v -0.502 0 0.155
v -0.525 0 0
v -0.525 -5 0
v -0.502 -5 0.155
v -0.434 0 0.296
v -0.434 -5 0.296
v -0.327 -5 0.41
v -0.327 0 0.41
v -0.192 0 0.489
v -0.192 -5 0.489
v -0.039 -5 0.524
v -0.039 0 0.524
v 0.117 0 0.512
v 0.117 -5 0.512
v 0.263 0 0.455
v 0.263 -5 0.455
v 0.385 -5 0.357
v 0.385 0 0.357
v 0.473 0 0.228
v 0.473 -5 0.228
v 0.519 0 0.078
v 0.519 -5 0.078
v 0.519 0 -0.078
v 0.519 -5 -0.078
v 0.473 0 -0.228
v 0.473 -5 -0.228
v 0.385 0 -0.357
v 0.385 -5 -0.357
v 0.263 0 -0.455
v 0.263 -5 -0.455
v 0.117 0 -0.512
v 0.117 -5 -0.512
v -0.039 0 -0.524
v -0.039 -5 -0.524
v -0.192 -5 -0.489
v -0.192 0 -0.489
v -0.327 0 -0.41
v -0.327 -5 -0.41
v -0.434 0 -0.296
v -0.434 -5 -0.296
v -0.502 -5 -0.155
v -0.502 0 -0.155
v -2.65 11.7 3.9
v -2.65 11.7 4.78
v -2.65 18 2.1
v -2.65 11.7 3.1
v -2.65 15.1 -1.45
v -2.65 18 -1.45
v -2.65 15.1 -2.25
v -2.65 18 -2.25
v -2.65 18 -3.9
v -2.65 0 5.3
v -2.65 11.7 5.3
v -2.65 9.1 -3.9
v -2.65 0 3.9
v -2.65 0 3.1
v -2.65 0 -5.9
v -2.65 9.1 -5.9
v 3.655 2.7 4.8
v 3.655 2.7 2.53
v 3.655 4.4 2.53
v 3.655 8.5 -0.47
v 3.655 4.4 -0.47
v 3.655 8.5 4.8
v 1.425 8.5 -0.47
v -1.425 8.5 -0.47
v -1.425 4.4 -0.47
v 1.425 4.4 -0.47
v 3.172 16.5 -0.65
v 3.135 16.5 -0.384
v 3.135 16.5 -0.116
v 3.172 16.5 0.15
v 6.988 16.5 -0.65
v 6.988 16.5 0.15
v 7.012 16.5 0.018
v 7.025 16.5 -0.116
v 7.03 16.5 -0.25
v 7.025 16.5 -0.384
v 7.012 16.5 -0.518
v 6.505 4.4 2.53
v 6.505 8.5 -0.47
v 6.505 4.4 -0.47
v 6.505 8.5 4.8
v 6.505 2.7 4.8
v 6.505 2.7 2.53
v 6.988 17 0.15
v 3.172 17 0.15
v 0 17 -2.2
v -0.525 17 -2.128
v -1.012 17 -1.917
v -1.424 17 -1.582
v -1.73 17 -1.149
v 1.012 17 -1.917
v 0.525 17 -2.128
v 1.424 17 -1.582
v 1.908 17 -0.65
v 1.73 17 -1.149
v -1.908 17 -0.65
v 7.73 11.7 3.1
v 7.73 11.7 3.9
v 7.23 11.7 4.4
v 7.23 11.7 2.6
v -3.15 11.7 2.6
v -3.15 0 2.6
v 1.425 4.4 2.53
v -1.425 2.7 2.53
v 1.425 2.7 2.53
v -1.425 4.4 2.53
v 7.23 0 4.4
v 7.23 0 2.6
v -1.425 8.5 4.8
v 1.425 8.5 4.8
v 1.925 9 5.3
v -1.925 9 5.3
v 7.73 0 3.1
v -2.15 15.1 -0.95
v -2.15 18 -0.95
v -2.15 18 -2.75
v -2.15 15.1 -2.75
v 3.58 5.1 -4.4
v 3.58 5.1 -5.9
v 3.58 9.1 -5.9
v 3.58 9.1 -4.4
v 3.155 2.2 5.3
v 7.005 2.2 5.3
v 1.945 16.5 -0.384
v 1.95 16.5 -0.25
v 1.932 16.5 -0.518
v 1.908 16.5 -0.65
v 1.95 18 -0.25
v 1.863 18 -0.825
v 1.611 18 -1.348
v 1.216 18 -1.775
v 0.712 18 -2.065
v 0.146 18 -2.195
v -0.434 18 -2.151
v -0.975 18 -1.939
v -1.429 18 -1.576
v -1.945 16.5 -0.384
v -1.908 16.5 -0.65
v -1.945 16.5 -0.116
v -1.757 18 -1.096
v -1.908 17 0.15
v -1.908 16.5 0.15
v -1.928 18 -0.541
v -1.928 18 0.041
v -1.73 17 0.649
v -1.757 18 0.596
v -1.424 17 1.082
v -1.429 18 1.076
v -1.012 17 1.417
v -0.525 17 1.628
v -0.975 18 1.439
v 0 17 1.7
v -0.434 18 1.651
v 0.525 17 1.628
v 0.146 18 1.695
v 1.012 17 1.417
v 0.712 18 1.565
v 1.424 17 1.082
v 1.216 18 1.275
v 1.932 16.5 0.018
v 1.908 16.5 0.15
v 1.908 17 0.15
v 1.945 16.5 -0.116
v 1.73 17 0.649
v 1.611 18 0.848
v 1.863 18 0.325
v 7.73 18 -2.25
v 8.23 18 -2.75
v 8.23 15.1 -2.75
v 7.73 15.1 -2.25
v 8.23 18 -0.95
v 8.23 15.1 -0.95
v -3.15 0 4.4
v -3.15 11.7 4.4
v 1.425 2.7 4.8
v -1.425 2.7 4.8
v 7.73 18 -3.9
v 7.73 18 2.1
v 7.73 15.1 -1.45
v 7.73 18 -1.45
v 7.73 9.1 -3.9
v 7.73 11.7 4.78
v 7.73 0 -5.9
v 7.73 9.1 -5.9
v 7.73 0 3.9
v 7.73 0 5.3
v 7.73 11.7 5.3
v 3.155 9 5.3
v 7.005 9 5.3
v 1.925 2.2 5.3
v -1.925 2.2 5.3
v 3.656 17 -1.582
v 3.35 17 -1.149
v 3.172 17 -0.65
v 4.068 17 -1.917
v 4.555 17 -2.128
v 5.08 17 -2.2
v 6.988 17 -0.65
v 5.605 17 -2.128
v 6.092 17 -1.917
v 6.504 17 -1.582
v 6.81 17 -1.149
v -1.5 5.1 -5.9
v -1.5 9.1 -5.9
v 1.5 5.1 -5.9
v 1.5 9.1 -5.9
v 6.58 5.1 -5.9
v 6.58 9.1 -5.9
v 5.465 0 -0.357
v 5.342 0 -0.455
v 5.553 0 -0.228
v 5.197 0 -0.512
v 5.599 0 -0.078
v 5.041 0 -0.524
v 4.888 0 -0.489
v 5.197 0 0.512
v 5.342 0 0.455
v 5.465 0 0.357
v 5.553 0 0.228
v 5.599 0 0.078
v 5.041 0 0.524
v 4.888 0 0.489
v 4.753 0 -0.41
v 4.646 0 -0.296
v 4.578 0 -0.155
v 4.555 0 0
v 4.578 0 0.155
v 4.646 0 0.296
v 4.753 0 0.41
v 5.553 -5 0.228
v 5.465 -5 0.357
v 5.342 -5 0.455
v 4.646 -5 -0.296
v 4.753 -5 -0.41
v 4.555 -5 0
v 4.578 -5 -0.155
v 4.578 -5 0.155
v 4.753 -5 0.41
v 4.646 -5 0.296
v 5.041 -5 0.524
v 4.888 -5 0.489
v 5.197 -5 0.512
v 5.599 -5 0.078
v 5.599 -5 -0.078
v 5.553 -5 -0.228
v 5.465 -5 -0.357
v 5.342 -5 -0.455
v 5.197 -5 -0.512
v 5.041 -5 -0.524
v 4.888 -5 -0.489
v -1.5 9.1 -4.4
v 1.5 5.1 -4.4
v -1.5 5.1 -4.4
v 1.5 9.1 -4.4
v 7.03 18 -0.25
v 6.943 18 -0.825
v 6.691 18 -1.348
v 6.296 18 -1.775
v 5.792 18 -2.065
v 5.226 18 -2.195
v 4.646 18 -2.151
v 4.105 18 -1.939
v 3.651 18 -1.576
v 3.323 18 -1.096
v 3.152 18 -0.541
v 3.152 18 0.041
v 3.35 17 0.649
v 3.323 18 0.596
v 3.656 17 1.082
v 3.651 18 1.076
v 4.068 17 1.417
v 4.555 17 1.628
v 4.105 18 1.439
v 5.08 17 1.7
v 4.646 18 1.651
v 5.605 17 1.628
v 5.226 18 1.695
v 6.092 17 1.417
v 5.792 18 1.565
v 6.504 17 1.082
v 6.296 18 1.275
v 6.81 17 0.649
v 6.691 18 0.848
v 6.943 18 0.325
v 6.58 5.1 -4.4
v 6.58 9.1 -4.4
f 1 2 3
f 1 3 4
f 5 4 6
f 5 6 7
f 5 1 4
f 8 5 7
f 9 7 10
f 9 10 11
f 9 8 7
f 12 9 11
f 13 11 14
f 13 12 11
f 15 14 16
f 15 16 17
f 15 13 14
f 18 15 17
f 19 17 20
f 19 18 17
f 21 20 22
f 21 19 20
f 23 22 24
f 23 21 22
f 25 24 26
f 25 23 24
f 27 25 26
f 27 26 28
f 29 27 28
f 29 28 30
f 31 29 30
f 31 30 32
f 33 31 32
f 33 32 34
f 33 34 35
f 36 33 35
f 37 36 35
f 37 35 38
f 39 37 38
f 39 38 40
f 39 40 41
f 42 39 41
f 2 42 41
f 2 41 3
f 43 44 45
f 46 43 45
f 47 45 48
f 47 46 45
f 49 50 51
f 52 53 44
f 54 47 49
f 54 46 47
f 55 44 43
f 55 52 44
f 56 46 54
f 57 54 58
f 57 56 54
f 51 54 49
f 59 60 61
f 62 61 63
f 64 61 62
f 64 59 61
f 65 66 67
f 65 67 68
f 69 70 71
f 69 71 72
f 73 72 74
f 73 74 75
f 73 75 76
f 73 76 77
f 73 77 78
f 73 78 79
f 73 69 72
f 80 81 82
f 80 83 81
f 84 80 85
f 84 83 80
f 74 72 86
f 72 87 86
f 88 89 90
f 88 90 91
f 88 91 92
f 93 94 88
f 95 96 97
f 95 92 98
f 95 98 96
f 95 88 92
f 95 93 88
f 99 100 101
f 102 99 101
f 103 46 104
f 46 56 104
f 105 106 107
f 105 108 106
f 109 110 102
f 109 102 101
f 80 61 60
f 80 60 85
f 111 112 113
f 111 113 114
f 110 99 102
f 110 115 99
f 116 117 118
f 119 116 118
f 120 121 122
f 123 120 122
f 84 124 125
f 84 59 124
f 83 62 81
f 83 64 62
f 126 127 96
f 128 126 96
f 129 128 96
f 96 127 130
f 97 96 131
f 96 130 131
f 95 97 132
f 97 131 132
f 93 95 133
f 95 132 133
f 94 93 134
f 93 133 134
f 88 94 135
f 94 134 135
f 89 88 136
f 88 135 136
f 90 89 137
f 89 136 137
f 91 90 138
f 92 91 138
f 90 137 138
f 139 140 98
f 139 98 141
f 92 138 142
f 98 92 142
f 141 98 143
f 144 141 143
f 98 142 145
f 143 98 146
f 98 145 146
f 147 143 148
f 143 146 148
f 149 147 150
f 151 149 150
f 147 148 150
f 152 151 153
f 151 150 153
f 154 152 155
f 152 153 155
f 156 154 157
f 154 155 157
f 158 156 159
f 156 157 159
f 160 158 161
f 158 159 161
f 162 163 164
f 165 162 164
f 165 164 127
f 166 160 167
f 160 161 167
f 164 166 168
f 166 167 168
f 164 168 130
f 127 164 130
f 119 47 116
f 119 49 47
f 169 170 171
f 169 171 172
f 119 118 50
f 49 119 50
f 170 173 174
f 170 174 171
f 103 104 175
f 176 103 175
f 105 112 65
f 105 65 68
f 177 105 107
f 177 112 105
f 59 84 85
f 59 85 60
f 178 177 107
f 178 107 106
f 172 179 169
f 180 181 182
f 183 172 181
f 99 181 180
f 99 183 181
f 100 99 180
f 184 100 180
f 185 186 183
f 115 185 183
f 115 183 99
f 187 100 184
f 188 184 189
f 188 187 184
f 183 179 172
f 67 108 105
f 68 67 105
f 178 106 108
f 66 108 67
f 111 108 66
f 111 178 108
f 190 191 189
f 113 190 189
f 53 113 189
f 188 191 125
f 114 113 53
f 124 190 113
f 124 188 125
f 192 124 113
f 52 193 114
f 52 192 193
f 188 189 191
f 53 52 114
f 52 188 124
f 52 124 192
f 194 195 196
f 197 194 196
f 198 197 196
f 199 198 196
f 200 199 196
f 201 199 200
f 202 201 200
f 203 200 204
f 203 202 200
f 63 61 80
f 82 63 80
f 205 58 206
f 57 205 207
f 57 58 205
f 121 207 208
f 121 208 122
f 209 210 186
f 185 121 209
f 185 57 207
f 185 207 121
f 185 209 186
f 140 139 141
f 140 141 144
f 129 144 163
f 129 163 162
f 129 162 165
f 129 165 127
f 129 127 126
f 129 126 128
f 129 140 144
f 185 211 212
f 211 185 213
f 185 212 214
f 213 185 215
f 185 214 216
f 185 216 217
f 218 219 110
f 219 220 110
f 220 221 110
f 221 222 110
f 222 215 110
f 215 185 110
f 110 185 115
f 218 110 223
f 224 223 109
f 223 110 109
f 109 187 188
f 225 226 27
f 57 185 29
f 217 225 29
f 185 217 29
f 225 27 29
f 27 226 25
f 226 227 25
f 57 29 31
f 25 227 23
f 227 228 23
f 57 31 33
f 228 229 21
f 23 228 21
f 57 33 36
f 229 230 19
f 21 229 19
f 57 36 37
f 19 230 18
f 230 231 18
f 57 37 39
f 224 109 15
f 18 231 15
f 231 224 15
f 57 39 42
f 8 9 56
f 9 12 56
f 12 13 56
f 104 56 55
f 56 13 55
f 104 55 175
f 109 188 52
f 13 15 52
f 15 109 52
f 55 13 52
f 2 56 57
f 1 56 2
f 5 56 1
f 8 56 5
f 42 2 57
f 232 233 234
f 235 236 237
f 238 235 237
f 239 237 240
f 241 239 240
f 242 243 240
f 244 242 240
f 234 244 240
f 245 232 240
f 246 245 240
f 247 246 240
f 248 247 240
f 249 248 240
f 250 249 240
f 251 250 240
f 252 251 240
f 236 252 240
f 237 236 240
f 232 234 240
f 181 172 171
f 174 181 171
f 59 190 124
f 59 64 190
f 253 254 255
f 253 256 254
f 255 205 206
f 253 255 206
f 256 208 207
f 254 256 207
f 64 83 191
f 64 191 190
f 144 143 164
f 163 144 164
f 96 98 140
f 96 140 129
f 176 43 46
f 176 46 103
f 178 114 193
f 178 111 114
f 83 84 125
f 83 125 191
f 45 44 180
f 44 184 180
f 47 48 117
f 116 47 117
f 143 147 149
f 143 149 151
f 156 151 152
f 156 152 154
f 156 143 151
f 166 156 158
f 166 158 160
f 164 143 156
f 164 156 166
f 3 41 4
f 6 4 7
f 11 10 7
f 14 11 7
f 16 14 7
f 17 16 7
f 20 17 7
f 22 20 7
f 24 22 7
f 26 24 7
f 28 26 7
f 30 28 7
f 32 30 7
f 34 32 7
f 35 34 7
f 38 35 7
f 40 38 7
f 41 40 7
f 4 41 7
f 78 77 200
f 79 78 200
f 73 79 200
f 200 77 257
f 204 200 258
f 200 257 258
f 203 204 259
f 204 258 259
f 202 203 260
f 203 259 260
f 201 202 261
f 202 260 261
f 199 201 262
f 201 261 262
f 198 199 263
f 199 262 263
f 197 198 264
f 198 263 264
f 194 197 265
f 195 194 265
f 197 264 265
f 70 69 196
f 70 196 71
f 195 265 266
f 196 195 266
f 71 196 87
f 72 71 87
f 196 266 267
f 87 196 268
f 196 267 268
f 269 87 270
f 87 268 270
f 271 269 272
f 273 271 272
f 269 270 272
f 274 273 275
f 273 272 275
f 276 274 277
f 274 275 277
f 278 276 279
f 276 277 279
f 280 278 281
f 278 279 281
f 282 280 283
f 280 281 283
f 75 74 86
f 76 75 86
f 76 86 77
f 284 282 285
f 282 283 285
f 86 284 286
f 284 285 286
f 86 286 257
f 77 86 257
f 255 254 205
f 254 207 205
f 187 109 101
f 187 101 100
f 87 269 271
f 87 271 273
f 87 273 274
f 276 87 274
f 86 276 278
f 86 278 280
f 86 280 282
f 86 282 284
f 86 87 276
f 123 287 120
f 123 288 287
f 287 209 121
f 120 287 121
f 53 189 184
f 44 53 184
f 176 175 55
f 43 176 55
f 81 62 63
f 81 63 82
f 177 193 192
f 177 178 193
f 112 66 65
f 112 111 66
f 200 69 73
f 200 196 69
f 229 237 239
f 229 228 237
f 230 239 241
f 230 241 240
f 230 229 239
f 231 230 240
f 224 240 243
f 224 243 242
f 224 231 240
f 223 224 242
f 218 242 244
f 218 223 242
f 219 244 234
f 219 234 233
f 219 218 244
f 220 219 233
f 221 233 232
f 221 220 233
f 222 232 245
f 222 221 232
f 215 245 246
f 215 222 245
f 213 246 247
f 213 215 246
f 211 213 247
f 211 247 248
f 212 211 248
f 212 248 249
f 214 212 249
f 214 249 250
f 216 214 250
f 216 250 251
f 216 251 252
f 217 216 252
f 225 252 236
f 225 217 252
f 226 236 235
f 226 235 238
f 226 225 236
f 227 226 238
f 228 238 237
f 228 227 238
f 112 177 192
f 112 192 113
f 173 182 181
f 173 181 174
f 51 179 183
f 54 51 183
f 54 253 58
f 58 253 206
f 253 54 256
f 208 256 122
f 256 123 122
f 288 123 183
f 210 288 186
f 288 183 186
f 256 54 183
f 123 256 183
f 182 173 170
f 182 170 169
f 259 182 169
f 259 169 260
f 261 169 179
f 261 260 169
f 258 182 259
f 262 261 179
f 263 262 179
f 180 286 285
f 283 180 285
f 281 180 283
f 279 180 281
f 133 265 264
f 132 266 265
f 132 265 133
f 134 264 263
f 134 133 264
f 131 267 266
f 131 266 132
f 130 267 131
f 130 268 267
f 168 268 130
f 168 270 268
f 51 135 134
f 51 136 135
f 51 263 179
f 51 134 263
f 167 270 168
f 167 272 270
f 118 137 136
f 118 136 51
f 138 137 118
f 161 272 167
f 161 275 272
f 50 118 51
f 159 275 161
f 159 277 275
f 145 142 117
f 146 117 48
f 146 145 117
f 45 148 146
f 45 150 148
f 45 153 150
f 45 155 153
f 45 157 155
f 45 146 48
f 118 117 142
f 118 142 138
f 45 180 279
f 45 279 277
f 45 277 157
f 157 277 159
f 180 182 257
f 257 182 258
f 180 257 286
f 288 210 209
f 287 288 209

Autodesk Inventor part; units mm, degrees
ref_plane "YZ Plane" through (0, 0, 0) normal (1, 0, 0) x (0, 1, 0)
ref_plane "XZ Plane" through (0, 0, 0) normal (0, 1, 0) x (-1, 0, 0)
ref_plane "XY Plane" through (0, 0, 0) normal (0, 0, 1) x (1, 0, 0)
sketch "Esquisse1" plane through (0, 0, 0) normal (0, 1, 0) x (-1, 0, 0)
  circle A0 centre (0, 0) radius 0.525
  line L0 (2.65, -5.9) -> (-2.65, -5.9)
  line L1 (-2.65, -5.9) -> (-2.65, 5.3)
  line L2 (-2.65, 5.3) -> (2.65, 5.3)
  line L3 (2.65, 5.3) -> (2.65, -5.9)
  point P0 (0, 5.3)
  dimension "d0" = 1.05
  dimension "d1" = 11.2
  dimension "d2" = 5.3
  dimension "d4" = 2.65
extrude "Extrusion1" add sketch "Esquisse1" along normal blind 18 contours A0 | L0 L1 L2 L3
sketch "Esquisse8" plane through (0, 0, 0) normal (0, 1, 0) x (-1, 0, 0)
  line L0 (-7.73, 3.1) -> (-7.23, 2.6)
  line L1 (-7.23, 2.6) -> (-7.23, 4.4)
  line L2 (-7.23, 4.4) -> (-7.73, 3.9)
  line L3 (-7.73, 3.9) -> (-7.73, 3.1)
  line L4 (2.65, 3.1) -> (3.15, 2.6)
  line L5 (3.15, 2.6) -> (3.15, 4.4)
  line L6 (3.15, 4.4) -> (2.65, 3.9)
  line L7 (2.65, 3.9) -> (2.65, 3.1)
  line L8 (-8.23, -0.95) -> (-8.23, -2.75)
  line L9 (-8.23, -2.75) -> (-7.73, -2.25)
  line L10 (-7.73, -2.25) -> (-7.73, -1.45)
  line L11 (-7.73, -1.45) -> (-8.23, -0.95)
  line L12 (2.15, -0.95) -> (2.15, -2.75)
  line L13 (2.15, -2.75) -> (2.65, -2.25)
  line L14 (2.65, -2.25) -> (2.65, -1.45)
  line L15 (2.65, -1.45) -> (2.15, -0.95)
  line L16 (0, 0) -> (0, -11.21) construction
  dimension "d45" = 45
  dimension "d46" = 0.8
  dimension "d47" = 1.8
  dimension "d48" = 4.4
  dimension "d49" = 45
  dimension "d50" = 0.8
  dimension "d51" = 1.8
  dimension "d53" = 7.73
  dimension "d56" = 2.65
  dimension "d105" = 1.8
  dimension "d106" = 45
  dimension "d107" = 0.8
  dimension "d108" = 135
  dimension "d109" = 1.8
  dimension "d110" = 45
  dimension "d111" = 0.8
  dimension "d112" = 135
  dimension "d119" = 2.75
sketch "Esquisse9" plane through (0, 18, 0) normal (0, 1, 0) x (1, 0, 0)
  line L0 (-2.15, 2.75) -> (-2.65, 2.25) projected
  line L1 (-2.65, 2.25) -> (-2.65, 1.45) projected
  line L2 (-2.15, 0.95) -> (-2.15, 2.75) projected
  line L3 (-2.65, 1.45) -> (-2.15, 0.95) projected
  line L4 (8.23, 2.75) -> (7.73, 2.25) projected
  line L5 (8.23, 0.95) -> (8.23, 2.75) projected
  line L6 (7.73, 1.45) -> (8.23, 0.95) projected
  line L7 (7.73, 2.25) -> (7.73, 1.45) projected
sketch "Esquisse2" plane through (2.65, 0, 5.3) normal (1, 0, 0) x (0, 0, -1)
  line L0 (11.2, 0) -> (0, 0) projected
  line L1 (11.2, 0) -> (11.2, 18) construction
  line L2 (0, 18) -> (11.2, 18) construction
  line L3 (0, 0) -> (0, 18) construction
  line L4 (3.2, 18) -> (9.2, 18)
  line L5 (9.2, 18) -> (9.2, 9.1)
  line L6 (9.2, 9.1) -> (11.2, 9.1)
  line L7 (0, 11.7) -> (0.52, 11.7)
  line L8 (0.52, 11.7) -> (3.2, 18)
  line L9 (0, 11.7) -> (0, 18)
  line L10 (0, 18) -> (3.2, 18)
  line L11 (9.2, 18) -> (11.2, 18)
  line L12 (11.2, 18) -> (11.2, 9.1)
  point P0 (5.3, 0)
  dimension "d7" = 0.52
  dimension "d8" = 6
  dimension "d9" = 9.1
  dimension "d10" = 2
  dimension "d11" = 11.7
extrude "Extrusion2" cut sketch "Esquisse2" against normal through all
sketch "Esquisse3" plane through (0, 18, 0) normal (0, 1, 0) x (1, 0, 0)
  line L0 (-2.65, -2.1) -> (2.65, -2.1) projected
  line L1 (2.65, -2.1) -> (2.65, 3.9) projected
  line L2 (2.65, 3.9) -> (-2.65, 3.9) projected
  line L3 (-2.65, 3.9) -> (-2.65, -2.1) projected
  circle A0 centre (0, 0.25) radius 1.95
  point P0 (0, 0)
  point P1 (0, -2.1)
  dimension "d14" = 3.9
  dimension "d15" = 1.7
extrude "Extrusion3" cut sketch "Esquisse3" against normal blind 1 contours A0
sketch "Esquisse4" plane through (0, 17, -0.25) normal (0, 1, 0) x (1, 0, 0)
  circle A0 centre (0, 0) radius 1.95 projected
  line L0 (-1.9085, 0.4) -> (1.9085, 0.4)
  line L1 (-1.9085, -0.4) -> (1.9085, -0.4)
  point P0 (0, -0.25)
  dimension "d18" = 0.8
extrude "Extrusion4" cut sketch "Esquisse4" against normal blind 0.5 contours A0 L1 L0
sketch "Esquisse5" plane through (-2.65, 0, 5.3) normal (0, 0, 1) x (1, 0, 0)
  line L0 (5.3, 11.7) -> (0, 11.7) projected
  line L1 (0, 0) -> (0, 11.7) projected
  line L2 (5.3, 0) -> (0, 0) projected
  line L3 (5.3, 0) -> (5.3, 11.7) projected
  line L4 (1.225, 8.5) -> (4.075, 8.5)
  line L5 (4.075, 8.5) -> (4.075, 2.7)
  line L6 (4.075, 2.7) -> (1.225, 2.7)
  line L7 (1.225, 2.7) -> (1.225, 8.5)
  point P0 (2.65, 0)
  dimension "d21" = 1.225
  dimension "d22" = 2.85
  dimension "d23" = 5.8
  dimension "d24" = 2.7
  dimension "d25" = 1.225
extrude "Extrusion5" cut sketch "Esquisse5" against normal blind 2.77 contours L4 L5 L6 L7
chamfer "Chanfrein1" distance 0.5 angle 45 4 edges at (-1.425, 5.6, 5.3) (0, 8.5, 5.3) (1.425, 5.6, 5.3) (0, 2.7, 5.3)
sketch "Esquisse6" plane through (-2.65, 0, 2.53) normal (0, 0, 1) x (1, 0, 0)
  line L0 (1.225, 8.5) -> (4.075, 8.5) projected
  line L1 (1.225, 2.7) -> (1.225, 8.5) projected
  line L2 (4.075, 2.7) -> (1.225, 2.7) projected
  line L3 (4.075, 8.5) -> (4.075, 2.7) projected
  line L4 (1.225, 4.4) -> (4.075, 4.4)
  point P0 (2.65, 0)
  dimension "d31" = 1.7
extrude "Extrusion6" cut sketch "Esquisse6" against normal blind 3 contours L0 L3 L4 L1
sketch "Esquisse7" plane through (2.65, 0, -5.9) normal (0, 0, -1) x (-1, 0, 0)
  line L0 (5.3, 9.1) -> (0, 9.1) construction
  line L1 (0, 0) -> (0, 9.1) construction
  line L2 (5.3, 0) -> (0, 0) construction
  line L3 (5.3, 0) -> (5.3, 9.1) construction
  line L4 (1.15, 9.1) -> (1.15, 5.1)
  line L5 (1.15, 5.1) -> (4.15, 5.1)
  line L6 (4.15, 5.1) -> (4.15, 9.1)
  line L7 (4.15, 9.1) -> (1.15, 9.1)
  point P0 (2.65, 0)
  dimension "d34" = 3
  dimension "d35" = 4
  dimension "d36" = 1.15
  dimension "d37" = 1.15
extrude "Extrusion7" cut sketch "Esquisse7" against normal blind 1.5
extrude "Extrusion8" add sketch "Esquisse1" against normal blind 5 contours A0
sketch "SilkS" plane through (0, 18, 0) normal (0, 1, 0) x (1, 0, 0)
  line L0 (2.65, -5.3) -> (-10.27, -5.3)
  line L1 (-10.27, 5.9) -> (2.65, 5.9)
  line L2 (-10.27, 5.9) -> (-10.27, -5.3)
  line L3 (2.65, 5.9) -> (2.65, -5.3)
  point P0 (0, 0)
  dimension "d121" = 10.27
sketch "CrtYd" plane through (0, 18, 0) normal (0, 1, 0) x (1, 0, 0)
  line L0 (7.73, -3.1) -> (7.23, -2.6) projected
  line L1 (7.23, -2.6) -> (7.23, -4.4) projected
  line L2 (7.73, -3.9) -> (7.73, -3.1) projected
  line L3 (7.23, -4.4) -> (7.73, -3.9) projected
  line L4 (-2.65, -3.1) -> (-3.15, -2.6) projected
  line L5 (-3.15, -2.6) -> (-3.15, -4.4) projected
  line L6 (-2.65, -3.9) -> (-2.65, -3.1) projected
  line L7 (-3.15, -4.4) -> (-2.65, -3.9) projected
  line L8 (2.65, 2.35) -> (2.65, 1.55) projected
  line L9 (3.15, 2.85) -> (2.65, 2.35) projected
  line L10 (3.15, 1.05) -> (3.15, 2.85) projected
  line L11 (2.65, 1.55) -> (3.15, 1.05) projected
  line L12 (-2.15, 2.85) -> (-2.65, 2.35) projected
  line L13 (-2.15, 1.05) -> (-2.15, 2.85) projected
  line L14 (-2.65, 2.35) -> (-2.65, 1.55) projected
  line L15 (-2.65, 1.55) -> (-2.15, 1.05) projected
  circle A0 centre (0, 0.25) radius 1.95 construction
  line L16 (1.425, -4.8) -> (-1.425, -4.8) construction
  line L17 (-1.925, -5.3) -> (-1.425, -4.8) construction
  line L18 (-1.925, -5.3) -> (1.925, -5.3) construction
  line L19 (1.925, -5.3) -> (1.425, -4.8) construction
  line L20 (1.425, -4.8) -> (-1.425, -4.8) construction
  line L21 (1.425, -4.8) -> (1.425, -2.53) construction
  line L22 (1.425, -2.53) -> (-1.425, -2.53) construction
  line L23 (-1.425, -4.8) -> (-1.425, -2.53) construction
  circle A1 centre (0, 0.25) radius 1.95
  line L24 (1.425, -2.53) -> (1.425, -4.8)
  line L25 (1.425, -4.8) -> (1.925, -5.3)
  line L26 (1.925, -5.3) -> (-1.925, -5.3)
  line L27 (-1.925, -5.3) -> (-1.425, -4.8)
  line L28 (-1.425, -4.8) -> (-1.425, -2.53)
  line L29 (-1.425, -2.53) -> (1.425, -2.53)
  line L30 (1.425, -4.8) -> (-1.425, -4.8)
  circle A2 centre (5.08, 0.25) radius 1.95
  line L31 (3.655, -2.53) -> (6.505, -2.53)
  line L32 (3.655, -4.8) -> (3.655, -2.53)
  line L33 (6.505, -2.53) -> (6.505, -4.8)
  line L34 (6.505, -4.8) -> (3.655, -4.8)
  line L35 (7.005, -5.3) -> (3.155, -5.3)
  line L36 (6.505, -4.8) -> (7.005, -5.3)
  line L37 (3.155, -5.3) -> (3.655, -4.8)
  line L38 (-2.65, -3.9) -> (-2.65, -5.3)
  line L39 (-2.65, -5.3) -> (7.73, -5.3)
  line L40 (7.73, -5.3) -> (7.73, -3.9)
  line L41 (2.65, -3.1) -> (2.65, 1.55)
  line L42 (2.65, 2.35) -> (2.65, 5.9)
  line L43 (2.65, 5.9) -> (-2.65, 5.9)
  line L44 (-2.65, 5.9) -> (-2.65, 2.35)
  line L45 (-2.65, 1.55) -> (-2.65, -3.1)
  point P0 (0, 0)
  dimension "d98" = 5.08
pattern_linear "Réseau rectangulaire1" count 2 spacing 5.08 along (1, 0, 0)
extrude "Extrusion9" cut sketch "Esquisse8" along normal up to surface (11.7 mm away) contours L3 L2 L1 L0
extrude "Extrusion10" add sketch "Esquisse8" along normal up to surface (11.7 mm away) contours L7 L6 L5 L4
extrude "Extrusion11" add sketch "Esquisse9" against normal blind 2.9 contours L5 L6 L7 L4
extrude "Extrusion12" cut sketch "Esquisse9" against normal blind 2.9 contours L2 L3 L1 L0
equation "\"d21\" = d25"
equation "\"d36\" = d37"
properties part number "bornier_vert_5.08_variable"
